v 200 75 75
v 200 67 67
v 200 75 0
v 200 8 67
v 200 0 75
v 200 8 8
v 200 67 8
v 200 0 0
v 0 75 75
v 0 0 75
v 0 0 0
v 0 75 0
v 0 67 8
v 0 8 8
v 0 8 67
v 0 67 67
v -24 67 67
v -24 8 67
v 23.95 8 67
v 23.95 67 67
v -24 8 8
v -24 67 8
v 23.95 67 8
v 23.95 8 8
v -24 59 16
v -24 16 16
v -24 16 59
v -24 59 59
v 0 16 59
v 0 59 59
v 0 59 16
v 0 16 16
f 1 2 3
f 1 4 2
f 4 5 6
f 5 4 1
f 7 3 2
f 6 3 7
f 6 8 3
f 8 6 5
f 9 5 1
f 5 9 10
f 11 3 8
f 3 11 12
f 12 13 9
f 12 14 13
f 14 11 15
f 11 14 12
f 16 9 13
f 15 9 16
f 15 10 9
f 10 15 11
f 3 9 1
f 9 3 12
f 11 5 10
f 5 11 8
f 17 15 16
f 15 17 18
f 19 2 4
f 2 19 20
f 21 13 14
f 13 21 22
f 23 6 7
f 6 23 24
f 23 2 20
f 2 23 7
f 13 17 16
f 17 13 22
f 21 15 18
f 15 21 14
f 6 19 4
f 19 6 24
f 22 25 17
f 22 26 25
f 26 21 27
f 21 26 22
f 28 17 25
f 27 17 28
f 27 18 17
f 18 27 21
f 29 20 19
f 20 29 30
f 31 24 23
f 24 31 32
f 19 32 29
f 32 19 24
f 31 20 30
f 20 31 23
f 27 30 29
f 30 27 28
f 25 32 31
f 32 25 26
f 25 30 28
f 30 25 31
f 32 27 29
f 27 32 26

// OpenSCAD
// module to model rolled hollow section with square or mitred ends
rhs(l=200,w=75,h=75,t=8,spigot=true);
module rhs(l=500,w=50,h=100,t=3,mitred=false,spigot=false){
    difference(){
    cube(size=[l,w,h]);
        if(mitred){
            rotate([0,-45,0]) cube([l+2,w+2,h+2]);
            translate([l,w,0]) rotate([0,-45,180]) cube([l,w,h]);
        }       
        translate([0,t,t]) cube([l+2,w-2*t,h-2*t]);
    }
    if(spigot)translate([0,w/2,h/2])rotate([0,-90,0])spigot(h,w,t);
}

module spigot(l,w,t){
    height=3*t;
    difference(){
        cube([l-2*t,w-2*t,2*height],center=true);
        hull(){
            translate([0,0,-0.05])cube([l-4*t,w-4*t,0.1],center=true);
            translate([0,0,-height])cube([l-2*t,w-2*t,0.1],center=true);
        }
        cube([l-4*t,w-4*t,2*height],center=true);

    }
}
